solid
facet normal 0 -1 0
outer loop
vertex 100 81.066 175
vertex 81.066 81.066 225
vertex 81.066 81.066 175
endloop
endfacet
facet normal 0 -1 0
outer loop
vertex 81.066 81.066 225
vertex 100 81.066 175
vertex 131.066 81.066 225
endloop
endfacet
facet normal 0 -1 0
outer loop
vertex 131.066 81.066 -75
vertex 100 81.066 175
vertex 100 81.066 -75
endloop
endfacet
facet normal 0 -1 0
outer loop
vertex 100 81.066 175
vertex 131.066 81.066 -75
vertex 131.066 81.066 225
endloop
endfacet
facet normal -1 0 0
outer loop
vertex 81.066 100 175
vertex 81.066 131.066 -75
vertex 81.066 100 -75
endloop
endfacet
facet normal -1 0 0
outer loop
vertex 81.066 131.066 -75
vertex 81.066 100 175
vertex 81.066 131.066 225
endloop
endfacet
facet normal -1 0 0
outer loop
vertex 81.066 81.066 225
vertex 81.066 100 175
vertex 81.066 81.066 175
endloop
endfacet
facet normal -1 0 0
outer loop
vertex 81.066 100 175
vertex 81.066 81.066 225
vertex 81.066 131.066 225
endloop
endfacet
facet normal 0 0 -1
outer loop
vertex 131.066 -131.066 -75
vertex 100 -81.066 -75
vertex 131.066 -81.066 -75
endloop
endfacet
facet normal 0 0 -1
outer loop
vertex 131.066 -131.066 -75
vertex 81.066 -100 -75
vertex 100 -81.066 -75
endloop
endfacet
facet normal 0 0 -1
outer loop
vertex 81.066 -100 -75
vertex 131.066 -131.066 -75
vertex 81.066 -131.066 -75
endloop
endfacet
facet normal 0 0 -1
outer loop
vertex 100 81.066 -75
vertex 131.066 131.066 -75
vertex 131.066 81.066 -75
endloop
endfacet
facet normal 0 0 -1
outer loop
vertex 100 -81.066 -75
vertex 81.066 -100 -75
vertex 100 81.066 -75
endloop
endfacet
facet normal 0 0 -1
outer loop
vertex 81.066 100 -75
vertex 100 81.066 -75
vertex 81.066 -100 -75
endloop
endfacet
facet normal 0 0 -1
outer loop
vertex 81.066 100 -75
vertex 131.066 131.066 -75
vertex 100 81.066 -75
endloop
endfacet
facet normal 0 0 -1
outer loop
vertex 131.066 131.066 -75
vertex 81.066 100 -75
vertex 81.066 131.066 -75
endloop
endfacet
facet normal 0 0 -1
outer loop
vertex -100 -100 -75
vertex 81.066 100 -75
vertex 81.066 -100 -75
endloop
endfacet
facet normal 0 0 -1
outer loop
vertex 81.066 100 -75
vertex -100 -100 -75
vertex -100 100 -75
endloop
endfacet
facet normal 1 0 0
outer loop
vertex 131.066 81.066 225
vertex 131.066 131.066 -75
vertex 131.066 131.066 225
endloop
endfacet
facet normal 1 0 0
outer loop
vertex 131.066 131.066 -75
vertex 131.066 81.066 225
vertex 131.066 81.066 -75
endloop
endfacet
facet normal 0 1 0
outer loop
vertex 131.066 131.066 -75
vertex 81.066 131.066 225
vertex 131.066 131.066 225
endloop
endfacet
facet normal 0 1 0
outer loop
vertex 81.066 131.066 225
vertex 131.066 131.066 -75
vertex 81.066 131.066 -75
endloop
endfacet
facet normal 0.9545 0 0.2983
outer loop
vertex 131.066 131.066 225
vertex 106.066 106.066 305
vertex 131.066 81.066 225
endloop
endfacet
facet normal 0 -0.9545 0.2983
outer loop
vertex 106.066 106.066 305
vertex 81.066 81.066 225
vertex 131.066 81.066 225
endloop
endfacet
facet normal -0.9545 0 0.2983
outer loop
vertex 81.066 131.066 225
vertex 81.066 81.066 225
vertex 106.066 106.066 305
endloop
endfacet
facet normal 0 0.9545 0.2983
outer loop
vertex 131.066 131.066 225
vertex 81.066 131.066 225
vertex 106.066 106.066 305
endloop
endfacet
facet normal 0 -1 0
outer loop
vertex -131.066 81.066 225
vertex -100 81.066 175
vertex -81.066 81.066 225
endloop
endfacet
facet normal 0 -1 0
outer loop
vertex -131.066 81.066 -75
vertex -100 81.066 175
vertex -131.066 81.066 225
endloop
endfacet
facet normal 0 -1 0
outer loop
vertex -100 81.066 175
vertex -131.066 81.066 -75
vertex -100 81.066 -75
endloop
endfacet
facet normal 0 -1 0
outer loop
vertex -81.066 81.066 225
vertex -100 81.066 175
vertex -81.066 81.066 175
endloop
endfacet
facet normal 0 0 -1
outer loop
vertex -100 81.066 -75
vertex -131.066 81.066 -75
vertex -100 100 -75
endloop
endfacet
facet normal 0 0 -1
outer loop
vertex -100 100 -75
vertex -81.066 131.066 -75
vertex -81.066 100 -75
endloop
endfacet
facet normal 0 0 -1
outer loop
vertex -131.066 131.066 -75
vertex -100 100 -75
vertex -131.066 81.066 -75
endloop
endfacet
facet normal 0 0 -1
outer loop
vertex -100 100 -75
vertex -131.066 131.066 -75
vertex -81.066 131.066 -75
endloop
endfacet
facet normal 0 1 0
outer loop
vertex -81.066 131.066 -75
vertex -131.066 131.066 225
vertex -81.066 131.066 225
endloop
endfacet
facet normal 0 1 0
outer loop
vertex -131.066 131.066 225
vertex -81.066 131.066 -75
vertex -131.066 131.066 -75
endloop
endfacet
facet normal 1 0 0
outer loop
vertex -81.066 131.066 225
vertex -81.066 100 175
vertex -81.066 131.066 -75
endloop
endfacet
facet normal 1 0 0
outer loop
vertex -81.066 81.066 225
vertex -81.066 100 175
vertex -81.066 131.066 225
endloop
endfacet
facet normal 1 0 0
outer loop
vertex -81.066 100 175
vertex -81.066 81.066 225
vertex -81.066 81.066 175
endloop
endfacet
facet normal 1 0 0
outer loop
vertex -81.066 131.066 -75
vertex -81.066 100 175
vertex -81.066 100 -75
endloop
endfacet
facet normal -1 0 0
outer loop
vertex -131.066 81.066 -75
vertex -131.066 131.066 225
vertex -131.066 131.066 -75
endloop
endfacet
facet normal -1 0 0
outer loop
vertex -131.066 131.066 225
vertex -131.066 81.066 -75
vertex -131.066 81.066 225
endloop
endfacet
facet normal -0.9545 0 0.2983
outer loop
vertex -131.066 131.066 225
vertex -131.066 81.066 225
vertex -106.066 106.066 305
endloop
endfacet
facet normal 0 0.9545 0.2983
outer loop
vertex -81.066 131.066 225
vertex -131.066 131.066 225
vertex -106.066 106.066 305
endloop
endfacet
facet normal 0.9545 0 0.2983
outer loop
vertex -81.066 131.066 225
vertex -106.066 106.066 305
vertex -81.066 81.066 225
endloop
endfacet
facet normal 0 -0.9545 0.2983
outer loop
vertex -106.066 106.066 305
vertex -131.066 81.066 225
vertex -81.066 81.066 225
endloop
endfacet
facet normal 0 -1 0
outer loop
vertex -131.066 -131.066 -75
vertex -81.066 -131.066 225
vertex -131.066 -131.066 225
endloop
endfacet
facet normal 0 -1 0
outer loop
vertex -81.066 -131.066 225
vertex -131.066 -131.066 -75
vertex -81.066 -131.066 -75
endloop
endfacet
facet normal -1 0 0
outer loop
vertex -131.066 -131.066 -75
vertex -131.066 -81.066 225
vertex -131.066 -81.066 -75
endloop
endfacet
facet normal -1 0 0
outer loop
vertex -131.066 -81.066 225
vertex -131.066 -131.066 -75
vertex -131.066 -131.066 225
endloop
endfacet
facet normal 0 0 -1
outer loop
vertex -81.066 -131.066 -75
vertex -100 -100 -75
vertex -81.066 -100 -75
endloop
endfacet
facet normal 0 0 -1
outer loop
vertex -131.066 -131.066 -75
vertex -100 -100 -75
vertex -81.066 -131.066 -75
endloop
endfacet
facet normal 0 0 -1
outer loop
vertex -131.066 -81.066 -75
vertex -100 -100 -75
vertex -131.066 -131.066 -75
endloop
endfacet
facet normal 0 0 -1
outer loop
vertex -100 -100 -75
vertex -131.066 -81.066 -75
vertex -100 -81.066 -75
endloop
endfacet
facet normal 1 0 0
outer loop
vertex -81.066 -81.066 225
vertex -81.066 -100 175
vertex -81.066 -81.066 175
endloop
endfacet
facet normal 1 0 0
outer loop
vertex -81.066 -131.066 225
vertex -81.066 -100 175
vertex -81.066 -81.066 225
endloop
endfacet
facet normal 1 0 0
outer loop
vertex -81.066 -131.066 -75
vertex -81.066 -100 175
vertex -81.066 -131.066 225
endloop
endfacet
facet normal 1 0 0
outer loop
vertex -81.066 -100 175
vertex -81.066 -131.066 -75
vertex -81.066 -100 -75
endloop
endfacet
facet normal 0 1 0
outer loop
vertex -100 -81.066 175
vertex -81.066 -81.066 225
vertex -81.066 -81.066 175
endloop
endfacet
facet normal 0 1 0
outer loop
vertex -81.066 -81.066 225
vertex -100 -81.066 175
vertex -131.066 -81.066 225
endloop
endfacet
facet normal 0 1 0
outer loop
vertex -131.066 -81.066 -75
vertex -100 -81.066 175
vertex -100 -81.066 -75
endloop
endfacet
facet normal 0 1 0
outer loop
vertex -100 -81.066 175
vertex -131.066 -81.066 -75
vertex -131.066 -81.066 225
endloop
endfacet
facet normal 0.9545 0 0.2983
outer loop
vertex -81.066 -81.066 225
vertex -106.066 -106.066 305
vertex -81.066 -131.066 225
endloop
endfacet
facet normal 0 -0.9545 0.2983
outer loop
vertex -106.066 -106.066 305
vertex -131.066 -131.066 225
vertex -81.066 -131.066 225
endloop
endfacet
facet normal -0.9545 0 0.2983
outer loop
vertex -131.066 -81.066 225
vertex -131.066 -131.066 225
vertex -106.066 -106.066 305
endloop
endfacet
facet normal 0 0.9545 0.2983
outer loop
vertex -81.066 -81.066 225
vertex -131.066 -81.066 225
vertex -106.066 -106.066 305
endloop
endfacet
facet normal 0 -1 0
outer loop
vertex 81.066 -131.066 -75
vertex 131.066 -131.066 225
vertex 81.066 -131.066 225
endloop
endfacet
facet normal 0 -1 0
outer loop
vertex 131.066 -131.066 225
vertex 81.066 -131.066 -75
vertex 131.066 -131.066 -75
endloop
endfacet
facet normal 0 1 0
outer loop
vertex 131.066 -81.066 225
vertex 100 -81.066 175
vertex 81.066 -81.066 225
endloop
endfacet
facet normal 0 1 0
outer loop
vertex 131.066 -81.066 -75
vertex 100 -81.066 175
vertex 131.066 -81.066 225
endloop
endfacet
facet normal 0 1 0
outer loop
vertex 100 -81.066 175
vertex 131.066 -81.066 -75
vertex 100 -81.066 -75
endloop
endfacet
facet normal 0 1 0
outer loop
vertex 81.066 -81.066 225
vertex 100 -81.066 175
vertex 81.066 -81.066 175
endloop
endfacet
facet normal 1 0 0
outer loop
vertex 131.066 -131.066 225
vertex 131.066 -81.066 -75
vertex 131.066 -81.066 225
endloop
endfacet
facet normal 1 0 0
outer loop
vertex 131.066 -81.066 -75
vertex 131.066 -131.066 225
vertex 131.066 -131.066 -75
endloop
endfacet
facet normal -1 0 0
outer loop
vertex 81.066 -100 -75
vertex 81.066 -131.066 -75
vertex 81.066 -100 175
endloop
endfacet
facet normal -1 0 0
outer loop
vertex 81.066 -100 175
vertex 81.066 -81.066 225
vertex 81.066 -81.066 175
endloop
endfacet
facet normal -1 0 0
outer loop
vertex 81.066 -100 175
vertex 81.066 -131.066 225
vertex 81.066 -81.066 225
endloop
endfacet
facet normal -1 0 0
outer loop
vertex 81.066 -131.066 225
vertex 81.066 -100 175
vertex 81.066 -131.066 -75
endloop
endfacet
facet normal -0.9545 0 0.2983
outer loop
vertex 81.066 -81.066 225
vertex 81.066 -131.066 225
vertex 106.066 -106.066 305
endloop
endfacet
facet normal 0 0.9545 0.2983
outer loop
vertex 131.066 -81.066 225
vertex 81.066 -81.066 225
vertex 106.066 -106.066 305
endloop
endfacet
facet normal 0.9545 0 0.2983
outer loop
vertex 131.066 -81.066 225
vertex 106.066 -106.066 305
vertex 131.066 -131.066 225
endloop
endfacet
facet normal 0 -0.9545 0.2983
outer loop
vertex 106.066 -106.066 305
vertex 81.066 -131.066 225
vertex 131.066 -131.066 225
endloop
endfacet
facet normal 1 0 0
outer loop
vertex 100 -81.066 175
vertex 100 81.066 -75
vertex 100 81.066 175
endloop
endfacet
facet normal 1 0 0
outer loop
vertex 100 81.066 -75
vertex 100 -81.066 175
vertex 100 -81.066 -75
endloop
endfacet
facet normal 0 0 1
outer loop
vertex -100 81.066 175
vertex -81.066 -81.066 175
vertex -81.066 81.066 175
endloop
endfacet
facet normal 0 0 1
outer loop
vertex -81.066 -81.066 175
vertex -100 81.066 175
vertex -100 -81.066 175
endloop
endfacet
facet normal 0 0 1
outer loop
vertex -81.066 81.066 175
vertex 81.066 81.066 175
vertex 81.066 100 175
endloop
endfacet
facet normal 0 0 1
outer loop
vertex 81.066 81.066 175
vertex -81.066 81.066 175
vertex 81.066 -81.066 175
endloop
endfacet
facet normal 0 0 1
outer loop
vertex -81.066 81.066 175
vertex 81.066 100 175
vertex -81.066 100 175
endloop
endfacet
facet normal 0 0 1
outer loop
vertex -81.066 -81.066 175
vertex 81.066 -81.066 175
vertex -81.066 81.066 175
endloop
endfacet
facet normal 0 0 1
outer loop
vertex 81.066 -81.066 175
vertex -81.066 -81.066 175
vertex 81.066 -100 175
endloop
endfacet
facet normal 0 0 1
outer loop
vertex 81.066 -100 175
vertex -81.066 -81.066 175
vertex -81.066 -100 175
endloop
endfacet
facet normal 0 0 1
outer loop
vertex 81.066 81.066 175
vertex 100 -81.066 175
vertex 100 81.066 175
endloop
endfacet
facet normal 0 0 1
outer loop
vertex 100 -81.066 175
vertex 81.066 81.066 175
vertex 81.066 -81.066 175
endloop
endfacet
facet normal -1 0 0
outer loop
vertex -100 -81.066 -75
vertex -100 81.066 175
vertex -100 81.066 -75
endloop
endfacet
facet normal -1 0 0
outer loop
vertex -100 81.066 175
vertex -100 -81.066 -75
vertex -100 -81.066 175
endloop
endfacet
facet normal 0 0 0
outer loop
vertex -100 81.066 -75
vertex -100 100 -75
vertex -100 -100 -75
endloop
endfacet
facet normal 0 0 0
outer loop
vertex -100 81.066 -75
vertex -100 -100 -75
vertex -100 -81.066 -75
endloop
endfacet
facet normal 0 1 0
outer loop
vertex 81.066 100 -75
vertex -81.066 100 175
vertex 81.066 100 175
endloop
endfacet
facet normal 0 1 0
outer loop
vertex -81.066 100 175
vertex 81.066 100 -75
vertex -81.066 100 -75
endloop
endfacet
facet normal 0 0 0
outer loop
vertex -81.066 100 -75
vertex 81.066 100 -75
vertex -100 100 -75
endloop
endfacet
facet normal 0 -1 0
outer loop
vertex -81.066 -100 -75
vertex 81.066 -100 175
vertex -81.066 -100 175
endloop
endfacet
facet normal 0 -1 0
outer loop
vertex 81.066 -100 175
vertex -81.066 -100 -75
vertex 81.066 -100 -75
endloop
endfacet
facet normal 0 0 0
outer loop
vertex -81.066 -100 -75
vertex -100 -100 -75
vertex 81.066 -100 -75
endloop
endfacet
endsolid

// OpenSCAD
//Torre principal

module central(h=150){
    
    for(i=[1:2:8]){
    rotate((360/8)*i)
    translate([150,0,(300-h)/2])
    rotate((360/8)*i)
    cube([50,50,300],center=true);
    
    rotate((360/8)*i)
    translate([150,0,(300/2)+((300-h)/2)])
    rotate((360/8)*i)
    linear_extrude(height=80,scale=0,twist=0)
    square([50,50],center=true);
    }
        
        
        
    translate([0,0,((250-h)/2)])
    cube([200,200,250],center=true);    
    
    }

    


central();
